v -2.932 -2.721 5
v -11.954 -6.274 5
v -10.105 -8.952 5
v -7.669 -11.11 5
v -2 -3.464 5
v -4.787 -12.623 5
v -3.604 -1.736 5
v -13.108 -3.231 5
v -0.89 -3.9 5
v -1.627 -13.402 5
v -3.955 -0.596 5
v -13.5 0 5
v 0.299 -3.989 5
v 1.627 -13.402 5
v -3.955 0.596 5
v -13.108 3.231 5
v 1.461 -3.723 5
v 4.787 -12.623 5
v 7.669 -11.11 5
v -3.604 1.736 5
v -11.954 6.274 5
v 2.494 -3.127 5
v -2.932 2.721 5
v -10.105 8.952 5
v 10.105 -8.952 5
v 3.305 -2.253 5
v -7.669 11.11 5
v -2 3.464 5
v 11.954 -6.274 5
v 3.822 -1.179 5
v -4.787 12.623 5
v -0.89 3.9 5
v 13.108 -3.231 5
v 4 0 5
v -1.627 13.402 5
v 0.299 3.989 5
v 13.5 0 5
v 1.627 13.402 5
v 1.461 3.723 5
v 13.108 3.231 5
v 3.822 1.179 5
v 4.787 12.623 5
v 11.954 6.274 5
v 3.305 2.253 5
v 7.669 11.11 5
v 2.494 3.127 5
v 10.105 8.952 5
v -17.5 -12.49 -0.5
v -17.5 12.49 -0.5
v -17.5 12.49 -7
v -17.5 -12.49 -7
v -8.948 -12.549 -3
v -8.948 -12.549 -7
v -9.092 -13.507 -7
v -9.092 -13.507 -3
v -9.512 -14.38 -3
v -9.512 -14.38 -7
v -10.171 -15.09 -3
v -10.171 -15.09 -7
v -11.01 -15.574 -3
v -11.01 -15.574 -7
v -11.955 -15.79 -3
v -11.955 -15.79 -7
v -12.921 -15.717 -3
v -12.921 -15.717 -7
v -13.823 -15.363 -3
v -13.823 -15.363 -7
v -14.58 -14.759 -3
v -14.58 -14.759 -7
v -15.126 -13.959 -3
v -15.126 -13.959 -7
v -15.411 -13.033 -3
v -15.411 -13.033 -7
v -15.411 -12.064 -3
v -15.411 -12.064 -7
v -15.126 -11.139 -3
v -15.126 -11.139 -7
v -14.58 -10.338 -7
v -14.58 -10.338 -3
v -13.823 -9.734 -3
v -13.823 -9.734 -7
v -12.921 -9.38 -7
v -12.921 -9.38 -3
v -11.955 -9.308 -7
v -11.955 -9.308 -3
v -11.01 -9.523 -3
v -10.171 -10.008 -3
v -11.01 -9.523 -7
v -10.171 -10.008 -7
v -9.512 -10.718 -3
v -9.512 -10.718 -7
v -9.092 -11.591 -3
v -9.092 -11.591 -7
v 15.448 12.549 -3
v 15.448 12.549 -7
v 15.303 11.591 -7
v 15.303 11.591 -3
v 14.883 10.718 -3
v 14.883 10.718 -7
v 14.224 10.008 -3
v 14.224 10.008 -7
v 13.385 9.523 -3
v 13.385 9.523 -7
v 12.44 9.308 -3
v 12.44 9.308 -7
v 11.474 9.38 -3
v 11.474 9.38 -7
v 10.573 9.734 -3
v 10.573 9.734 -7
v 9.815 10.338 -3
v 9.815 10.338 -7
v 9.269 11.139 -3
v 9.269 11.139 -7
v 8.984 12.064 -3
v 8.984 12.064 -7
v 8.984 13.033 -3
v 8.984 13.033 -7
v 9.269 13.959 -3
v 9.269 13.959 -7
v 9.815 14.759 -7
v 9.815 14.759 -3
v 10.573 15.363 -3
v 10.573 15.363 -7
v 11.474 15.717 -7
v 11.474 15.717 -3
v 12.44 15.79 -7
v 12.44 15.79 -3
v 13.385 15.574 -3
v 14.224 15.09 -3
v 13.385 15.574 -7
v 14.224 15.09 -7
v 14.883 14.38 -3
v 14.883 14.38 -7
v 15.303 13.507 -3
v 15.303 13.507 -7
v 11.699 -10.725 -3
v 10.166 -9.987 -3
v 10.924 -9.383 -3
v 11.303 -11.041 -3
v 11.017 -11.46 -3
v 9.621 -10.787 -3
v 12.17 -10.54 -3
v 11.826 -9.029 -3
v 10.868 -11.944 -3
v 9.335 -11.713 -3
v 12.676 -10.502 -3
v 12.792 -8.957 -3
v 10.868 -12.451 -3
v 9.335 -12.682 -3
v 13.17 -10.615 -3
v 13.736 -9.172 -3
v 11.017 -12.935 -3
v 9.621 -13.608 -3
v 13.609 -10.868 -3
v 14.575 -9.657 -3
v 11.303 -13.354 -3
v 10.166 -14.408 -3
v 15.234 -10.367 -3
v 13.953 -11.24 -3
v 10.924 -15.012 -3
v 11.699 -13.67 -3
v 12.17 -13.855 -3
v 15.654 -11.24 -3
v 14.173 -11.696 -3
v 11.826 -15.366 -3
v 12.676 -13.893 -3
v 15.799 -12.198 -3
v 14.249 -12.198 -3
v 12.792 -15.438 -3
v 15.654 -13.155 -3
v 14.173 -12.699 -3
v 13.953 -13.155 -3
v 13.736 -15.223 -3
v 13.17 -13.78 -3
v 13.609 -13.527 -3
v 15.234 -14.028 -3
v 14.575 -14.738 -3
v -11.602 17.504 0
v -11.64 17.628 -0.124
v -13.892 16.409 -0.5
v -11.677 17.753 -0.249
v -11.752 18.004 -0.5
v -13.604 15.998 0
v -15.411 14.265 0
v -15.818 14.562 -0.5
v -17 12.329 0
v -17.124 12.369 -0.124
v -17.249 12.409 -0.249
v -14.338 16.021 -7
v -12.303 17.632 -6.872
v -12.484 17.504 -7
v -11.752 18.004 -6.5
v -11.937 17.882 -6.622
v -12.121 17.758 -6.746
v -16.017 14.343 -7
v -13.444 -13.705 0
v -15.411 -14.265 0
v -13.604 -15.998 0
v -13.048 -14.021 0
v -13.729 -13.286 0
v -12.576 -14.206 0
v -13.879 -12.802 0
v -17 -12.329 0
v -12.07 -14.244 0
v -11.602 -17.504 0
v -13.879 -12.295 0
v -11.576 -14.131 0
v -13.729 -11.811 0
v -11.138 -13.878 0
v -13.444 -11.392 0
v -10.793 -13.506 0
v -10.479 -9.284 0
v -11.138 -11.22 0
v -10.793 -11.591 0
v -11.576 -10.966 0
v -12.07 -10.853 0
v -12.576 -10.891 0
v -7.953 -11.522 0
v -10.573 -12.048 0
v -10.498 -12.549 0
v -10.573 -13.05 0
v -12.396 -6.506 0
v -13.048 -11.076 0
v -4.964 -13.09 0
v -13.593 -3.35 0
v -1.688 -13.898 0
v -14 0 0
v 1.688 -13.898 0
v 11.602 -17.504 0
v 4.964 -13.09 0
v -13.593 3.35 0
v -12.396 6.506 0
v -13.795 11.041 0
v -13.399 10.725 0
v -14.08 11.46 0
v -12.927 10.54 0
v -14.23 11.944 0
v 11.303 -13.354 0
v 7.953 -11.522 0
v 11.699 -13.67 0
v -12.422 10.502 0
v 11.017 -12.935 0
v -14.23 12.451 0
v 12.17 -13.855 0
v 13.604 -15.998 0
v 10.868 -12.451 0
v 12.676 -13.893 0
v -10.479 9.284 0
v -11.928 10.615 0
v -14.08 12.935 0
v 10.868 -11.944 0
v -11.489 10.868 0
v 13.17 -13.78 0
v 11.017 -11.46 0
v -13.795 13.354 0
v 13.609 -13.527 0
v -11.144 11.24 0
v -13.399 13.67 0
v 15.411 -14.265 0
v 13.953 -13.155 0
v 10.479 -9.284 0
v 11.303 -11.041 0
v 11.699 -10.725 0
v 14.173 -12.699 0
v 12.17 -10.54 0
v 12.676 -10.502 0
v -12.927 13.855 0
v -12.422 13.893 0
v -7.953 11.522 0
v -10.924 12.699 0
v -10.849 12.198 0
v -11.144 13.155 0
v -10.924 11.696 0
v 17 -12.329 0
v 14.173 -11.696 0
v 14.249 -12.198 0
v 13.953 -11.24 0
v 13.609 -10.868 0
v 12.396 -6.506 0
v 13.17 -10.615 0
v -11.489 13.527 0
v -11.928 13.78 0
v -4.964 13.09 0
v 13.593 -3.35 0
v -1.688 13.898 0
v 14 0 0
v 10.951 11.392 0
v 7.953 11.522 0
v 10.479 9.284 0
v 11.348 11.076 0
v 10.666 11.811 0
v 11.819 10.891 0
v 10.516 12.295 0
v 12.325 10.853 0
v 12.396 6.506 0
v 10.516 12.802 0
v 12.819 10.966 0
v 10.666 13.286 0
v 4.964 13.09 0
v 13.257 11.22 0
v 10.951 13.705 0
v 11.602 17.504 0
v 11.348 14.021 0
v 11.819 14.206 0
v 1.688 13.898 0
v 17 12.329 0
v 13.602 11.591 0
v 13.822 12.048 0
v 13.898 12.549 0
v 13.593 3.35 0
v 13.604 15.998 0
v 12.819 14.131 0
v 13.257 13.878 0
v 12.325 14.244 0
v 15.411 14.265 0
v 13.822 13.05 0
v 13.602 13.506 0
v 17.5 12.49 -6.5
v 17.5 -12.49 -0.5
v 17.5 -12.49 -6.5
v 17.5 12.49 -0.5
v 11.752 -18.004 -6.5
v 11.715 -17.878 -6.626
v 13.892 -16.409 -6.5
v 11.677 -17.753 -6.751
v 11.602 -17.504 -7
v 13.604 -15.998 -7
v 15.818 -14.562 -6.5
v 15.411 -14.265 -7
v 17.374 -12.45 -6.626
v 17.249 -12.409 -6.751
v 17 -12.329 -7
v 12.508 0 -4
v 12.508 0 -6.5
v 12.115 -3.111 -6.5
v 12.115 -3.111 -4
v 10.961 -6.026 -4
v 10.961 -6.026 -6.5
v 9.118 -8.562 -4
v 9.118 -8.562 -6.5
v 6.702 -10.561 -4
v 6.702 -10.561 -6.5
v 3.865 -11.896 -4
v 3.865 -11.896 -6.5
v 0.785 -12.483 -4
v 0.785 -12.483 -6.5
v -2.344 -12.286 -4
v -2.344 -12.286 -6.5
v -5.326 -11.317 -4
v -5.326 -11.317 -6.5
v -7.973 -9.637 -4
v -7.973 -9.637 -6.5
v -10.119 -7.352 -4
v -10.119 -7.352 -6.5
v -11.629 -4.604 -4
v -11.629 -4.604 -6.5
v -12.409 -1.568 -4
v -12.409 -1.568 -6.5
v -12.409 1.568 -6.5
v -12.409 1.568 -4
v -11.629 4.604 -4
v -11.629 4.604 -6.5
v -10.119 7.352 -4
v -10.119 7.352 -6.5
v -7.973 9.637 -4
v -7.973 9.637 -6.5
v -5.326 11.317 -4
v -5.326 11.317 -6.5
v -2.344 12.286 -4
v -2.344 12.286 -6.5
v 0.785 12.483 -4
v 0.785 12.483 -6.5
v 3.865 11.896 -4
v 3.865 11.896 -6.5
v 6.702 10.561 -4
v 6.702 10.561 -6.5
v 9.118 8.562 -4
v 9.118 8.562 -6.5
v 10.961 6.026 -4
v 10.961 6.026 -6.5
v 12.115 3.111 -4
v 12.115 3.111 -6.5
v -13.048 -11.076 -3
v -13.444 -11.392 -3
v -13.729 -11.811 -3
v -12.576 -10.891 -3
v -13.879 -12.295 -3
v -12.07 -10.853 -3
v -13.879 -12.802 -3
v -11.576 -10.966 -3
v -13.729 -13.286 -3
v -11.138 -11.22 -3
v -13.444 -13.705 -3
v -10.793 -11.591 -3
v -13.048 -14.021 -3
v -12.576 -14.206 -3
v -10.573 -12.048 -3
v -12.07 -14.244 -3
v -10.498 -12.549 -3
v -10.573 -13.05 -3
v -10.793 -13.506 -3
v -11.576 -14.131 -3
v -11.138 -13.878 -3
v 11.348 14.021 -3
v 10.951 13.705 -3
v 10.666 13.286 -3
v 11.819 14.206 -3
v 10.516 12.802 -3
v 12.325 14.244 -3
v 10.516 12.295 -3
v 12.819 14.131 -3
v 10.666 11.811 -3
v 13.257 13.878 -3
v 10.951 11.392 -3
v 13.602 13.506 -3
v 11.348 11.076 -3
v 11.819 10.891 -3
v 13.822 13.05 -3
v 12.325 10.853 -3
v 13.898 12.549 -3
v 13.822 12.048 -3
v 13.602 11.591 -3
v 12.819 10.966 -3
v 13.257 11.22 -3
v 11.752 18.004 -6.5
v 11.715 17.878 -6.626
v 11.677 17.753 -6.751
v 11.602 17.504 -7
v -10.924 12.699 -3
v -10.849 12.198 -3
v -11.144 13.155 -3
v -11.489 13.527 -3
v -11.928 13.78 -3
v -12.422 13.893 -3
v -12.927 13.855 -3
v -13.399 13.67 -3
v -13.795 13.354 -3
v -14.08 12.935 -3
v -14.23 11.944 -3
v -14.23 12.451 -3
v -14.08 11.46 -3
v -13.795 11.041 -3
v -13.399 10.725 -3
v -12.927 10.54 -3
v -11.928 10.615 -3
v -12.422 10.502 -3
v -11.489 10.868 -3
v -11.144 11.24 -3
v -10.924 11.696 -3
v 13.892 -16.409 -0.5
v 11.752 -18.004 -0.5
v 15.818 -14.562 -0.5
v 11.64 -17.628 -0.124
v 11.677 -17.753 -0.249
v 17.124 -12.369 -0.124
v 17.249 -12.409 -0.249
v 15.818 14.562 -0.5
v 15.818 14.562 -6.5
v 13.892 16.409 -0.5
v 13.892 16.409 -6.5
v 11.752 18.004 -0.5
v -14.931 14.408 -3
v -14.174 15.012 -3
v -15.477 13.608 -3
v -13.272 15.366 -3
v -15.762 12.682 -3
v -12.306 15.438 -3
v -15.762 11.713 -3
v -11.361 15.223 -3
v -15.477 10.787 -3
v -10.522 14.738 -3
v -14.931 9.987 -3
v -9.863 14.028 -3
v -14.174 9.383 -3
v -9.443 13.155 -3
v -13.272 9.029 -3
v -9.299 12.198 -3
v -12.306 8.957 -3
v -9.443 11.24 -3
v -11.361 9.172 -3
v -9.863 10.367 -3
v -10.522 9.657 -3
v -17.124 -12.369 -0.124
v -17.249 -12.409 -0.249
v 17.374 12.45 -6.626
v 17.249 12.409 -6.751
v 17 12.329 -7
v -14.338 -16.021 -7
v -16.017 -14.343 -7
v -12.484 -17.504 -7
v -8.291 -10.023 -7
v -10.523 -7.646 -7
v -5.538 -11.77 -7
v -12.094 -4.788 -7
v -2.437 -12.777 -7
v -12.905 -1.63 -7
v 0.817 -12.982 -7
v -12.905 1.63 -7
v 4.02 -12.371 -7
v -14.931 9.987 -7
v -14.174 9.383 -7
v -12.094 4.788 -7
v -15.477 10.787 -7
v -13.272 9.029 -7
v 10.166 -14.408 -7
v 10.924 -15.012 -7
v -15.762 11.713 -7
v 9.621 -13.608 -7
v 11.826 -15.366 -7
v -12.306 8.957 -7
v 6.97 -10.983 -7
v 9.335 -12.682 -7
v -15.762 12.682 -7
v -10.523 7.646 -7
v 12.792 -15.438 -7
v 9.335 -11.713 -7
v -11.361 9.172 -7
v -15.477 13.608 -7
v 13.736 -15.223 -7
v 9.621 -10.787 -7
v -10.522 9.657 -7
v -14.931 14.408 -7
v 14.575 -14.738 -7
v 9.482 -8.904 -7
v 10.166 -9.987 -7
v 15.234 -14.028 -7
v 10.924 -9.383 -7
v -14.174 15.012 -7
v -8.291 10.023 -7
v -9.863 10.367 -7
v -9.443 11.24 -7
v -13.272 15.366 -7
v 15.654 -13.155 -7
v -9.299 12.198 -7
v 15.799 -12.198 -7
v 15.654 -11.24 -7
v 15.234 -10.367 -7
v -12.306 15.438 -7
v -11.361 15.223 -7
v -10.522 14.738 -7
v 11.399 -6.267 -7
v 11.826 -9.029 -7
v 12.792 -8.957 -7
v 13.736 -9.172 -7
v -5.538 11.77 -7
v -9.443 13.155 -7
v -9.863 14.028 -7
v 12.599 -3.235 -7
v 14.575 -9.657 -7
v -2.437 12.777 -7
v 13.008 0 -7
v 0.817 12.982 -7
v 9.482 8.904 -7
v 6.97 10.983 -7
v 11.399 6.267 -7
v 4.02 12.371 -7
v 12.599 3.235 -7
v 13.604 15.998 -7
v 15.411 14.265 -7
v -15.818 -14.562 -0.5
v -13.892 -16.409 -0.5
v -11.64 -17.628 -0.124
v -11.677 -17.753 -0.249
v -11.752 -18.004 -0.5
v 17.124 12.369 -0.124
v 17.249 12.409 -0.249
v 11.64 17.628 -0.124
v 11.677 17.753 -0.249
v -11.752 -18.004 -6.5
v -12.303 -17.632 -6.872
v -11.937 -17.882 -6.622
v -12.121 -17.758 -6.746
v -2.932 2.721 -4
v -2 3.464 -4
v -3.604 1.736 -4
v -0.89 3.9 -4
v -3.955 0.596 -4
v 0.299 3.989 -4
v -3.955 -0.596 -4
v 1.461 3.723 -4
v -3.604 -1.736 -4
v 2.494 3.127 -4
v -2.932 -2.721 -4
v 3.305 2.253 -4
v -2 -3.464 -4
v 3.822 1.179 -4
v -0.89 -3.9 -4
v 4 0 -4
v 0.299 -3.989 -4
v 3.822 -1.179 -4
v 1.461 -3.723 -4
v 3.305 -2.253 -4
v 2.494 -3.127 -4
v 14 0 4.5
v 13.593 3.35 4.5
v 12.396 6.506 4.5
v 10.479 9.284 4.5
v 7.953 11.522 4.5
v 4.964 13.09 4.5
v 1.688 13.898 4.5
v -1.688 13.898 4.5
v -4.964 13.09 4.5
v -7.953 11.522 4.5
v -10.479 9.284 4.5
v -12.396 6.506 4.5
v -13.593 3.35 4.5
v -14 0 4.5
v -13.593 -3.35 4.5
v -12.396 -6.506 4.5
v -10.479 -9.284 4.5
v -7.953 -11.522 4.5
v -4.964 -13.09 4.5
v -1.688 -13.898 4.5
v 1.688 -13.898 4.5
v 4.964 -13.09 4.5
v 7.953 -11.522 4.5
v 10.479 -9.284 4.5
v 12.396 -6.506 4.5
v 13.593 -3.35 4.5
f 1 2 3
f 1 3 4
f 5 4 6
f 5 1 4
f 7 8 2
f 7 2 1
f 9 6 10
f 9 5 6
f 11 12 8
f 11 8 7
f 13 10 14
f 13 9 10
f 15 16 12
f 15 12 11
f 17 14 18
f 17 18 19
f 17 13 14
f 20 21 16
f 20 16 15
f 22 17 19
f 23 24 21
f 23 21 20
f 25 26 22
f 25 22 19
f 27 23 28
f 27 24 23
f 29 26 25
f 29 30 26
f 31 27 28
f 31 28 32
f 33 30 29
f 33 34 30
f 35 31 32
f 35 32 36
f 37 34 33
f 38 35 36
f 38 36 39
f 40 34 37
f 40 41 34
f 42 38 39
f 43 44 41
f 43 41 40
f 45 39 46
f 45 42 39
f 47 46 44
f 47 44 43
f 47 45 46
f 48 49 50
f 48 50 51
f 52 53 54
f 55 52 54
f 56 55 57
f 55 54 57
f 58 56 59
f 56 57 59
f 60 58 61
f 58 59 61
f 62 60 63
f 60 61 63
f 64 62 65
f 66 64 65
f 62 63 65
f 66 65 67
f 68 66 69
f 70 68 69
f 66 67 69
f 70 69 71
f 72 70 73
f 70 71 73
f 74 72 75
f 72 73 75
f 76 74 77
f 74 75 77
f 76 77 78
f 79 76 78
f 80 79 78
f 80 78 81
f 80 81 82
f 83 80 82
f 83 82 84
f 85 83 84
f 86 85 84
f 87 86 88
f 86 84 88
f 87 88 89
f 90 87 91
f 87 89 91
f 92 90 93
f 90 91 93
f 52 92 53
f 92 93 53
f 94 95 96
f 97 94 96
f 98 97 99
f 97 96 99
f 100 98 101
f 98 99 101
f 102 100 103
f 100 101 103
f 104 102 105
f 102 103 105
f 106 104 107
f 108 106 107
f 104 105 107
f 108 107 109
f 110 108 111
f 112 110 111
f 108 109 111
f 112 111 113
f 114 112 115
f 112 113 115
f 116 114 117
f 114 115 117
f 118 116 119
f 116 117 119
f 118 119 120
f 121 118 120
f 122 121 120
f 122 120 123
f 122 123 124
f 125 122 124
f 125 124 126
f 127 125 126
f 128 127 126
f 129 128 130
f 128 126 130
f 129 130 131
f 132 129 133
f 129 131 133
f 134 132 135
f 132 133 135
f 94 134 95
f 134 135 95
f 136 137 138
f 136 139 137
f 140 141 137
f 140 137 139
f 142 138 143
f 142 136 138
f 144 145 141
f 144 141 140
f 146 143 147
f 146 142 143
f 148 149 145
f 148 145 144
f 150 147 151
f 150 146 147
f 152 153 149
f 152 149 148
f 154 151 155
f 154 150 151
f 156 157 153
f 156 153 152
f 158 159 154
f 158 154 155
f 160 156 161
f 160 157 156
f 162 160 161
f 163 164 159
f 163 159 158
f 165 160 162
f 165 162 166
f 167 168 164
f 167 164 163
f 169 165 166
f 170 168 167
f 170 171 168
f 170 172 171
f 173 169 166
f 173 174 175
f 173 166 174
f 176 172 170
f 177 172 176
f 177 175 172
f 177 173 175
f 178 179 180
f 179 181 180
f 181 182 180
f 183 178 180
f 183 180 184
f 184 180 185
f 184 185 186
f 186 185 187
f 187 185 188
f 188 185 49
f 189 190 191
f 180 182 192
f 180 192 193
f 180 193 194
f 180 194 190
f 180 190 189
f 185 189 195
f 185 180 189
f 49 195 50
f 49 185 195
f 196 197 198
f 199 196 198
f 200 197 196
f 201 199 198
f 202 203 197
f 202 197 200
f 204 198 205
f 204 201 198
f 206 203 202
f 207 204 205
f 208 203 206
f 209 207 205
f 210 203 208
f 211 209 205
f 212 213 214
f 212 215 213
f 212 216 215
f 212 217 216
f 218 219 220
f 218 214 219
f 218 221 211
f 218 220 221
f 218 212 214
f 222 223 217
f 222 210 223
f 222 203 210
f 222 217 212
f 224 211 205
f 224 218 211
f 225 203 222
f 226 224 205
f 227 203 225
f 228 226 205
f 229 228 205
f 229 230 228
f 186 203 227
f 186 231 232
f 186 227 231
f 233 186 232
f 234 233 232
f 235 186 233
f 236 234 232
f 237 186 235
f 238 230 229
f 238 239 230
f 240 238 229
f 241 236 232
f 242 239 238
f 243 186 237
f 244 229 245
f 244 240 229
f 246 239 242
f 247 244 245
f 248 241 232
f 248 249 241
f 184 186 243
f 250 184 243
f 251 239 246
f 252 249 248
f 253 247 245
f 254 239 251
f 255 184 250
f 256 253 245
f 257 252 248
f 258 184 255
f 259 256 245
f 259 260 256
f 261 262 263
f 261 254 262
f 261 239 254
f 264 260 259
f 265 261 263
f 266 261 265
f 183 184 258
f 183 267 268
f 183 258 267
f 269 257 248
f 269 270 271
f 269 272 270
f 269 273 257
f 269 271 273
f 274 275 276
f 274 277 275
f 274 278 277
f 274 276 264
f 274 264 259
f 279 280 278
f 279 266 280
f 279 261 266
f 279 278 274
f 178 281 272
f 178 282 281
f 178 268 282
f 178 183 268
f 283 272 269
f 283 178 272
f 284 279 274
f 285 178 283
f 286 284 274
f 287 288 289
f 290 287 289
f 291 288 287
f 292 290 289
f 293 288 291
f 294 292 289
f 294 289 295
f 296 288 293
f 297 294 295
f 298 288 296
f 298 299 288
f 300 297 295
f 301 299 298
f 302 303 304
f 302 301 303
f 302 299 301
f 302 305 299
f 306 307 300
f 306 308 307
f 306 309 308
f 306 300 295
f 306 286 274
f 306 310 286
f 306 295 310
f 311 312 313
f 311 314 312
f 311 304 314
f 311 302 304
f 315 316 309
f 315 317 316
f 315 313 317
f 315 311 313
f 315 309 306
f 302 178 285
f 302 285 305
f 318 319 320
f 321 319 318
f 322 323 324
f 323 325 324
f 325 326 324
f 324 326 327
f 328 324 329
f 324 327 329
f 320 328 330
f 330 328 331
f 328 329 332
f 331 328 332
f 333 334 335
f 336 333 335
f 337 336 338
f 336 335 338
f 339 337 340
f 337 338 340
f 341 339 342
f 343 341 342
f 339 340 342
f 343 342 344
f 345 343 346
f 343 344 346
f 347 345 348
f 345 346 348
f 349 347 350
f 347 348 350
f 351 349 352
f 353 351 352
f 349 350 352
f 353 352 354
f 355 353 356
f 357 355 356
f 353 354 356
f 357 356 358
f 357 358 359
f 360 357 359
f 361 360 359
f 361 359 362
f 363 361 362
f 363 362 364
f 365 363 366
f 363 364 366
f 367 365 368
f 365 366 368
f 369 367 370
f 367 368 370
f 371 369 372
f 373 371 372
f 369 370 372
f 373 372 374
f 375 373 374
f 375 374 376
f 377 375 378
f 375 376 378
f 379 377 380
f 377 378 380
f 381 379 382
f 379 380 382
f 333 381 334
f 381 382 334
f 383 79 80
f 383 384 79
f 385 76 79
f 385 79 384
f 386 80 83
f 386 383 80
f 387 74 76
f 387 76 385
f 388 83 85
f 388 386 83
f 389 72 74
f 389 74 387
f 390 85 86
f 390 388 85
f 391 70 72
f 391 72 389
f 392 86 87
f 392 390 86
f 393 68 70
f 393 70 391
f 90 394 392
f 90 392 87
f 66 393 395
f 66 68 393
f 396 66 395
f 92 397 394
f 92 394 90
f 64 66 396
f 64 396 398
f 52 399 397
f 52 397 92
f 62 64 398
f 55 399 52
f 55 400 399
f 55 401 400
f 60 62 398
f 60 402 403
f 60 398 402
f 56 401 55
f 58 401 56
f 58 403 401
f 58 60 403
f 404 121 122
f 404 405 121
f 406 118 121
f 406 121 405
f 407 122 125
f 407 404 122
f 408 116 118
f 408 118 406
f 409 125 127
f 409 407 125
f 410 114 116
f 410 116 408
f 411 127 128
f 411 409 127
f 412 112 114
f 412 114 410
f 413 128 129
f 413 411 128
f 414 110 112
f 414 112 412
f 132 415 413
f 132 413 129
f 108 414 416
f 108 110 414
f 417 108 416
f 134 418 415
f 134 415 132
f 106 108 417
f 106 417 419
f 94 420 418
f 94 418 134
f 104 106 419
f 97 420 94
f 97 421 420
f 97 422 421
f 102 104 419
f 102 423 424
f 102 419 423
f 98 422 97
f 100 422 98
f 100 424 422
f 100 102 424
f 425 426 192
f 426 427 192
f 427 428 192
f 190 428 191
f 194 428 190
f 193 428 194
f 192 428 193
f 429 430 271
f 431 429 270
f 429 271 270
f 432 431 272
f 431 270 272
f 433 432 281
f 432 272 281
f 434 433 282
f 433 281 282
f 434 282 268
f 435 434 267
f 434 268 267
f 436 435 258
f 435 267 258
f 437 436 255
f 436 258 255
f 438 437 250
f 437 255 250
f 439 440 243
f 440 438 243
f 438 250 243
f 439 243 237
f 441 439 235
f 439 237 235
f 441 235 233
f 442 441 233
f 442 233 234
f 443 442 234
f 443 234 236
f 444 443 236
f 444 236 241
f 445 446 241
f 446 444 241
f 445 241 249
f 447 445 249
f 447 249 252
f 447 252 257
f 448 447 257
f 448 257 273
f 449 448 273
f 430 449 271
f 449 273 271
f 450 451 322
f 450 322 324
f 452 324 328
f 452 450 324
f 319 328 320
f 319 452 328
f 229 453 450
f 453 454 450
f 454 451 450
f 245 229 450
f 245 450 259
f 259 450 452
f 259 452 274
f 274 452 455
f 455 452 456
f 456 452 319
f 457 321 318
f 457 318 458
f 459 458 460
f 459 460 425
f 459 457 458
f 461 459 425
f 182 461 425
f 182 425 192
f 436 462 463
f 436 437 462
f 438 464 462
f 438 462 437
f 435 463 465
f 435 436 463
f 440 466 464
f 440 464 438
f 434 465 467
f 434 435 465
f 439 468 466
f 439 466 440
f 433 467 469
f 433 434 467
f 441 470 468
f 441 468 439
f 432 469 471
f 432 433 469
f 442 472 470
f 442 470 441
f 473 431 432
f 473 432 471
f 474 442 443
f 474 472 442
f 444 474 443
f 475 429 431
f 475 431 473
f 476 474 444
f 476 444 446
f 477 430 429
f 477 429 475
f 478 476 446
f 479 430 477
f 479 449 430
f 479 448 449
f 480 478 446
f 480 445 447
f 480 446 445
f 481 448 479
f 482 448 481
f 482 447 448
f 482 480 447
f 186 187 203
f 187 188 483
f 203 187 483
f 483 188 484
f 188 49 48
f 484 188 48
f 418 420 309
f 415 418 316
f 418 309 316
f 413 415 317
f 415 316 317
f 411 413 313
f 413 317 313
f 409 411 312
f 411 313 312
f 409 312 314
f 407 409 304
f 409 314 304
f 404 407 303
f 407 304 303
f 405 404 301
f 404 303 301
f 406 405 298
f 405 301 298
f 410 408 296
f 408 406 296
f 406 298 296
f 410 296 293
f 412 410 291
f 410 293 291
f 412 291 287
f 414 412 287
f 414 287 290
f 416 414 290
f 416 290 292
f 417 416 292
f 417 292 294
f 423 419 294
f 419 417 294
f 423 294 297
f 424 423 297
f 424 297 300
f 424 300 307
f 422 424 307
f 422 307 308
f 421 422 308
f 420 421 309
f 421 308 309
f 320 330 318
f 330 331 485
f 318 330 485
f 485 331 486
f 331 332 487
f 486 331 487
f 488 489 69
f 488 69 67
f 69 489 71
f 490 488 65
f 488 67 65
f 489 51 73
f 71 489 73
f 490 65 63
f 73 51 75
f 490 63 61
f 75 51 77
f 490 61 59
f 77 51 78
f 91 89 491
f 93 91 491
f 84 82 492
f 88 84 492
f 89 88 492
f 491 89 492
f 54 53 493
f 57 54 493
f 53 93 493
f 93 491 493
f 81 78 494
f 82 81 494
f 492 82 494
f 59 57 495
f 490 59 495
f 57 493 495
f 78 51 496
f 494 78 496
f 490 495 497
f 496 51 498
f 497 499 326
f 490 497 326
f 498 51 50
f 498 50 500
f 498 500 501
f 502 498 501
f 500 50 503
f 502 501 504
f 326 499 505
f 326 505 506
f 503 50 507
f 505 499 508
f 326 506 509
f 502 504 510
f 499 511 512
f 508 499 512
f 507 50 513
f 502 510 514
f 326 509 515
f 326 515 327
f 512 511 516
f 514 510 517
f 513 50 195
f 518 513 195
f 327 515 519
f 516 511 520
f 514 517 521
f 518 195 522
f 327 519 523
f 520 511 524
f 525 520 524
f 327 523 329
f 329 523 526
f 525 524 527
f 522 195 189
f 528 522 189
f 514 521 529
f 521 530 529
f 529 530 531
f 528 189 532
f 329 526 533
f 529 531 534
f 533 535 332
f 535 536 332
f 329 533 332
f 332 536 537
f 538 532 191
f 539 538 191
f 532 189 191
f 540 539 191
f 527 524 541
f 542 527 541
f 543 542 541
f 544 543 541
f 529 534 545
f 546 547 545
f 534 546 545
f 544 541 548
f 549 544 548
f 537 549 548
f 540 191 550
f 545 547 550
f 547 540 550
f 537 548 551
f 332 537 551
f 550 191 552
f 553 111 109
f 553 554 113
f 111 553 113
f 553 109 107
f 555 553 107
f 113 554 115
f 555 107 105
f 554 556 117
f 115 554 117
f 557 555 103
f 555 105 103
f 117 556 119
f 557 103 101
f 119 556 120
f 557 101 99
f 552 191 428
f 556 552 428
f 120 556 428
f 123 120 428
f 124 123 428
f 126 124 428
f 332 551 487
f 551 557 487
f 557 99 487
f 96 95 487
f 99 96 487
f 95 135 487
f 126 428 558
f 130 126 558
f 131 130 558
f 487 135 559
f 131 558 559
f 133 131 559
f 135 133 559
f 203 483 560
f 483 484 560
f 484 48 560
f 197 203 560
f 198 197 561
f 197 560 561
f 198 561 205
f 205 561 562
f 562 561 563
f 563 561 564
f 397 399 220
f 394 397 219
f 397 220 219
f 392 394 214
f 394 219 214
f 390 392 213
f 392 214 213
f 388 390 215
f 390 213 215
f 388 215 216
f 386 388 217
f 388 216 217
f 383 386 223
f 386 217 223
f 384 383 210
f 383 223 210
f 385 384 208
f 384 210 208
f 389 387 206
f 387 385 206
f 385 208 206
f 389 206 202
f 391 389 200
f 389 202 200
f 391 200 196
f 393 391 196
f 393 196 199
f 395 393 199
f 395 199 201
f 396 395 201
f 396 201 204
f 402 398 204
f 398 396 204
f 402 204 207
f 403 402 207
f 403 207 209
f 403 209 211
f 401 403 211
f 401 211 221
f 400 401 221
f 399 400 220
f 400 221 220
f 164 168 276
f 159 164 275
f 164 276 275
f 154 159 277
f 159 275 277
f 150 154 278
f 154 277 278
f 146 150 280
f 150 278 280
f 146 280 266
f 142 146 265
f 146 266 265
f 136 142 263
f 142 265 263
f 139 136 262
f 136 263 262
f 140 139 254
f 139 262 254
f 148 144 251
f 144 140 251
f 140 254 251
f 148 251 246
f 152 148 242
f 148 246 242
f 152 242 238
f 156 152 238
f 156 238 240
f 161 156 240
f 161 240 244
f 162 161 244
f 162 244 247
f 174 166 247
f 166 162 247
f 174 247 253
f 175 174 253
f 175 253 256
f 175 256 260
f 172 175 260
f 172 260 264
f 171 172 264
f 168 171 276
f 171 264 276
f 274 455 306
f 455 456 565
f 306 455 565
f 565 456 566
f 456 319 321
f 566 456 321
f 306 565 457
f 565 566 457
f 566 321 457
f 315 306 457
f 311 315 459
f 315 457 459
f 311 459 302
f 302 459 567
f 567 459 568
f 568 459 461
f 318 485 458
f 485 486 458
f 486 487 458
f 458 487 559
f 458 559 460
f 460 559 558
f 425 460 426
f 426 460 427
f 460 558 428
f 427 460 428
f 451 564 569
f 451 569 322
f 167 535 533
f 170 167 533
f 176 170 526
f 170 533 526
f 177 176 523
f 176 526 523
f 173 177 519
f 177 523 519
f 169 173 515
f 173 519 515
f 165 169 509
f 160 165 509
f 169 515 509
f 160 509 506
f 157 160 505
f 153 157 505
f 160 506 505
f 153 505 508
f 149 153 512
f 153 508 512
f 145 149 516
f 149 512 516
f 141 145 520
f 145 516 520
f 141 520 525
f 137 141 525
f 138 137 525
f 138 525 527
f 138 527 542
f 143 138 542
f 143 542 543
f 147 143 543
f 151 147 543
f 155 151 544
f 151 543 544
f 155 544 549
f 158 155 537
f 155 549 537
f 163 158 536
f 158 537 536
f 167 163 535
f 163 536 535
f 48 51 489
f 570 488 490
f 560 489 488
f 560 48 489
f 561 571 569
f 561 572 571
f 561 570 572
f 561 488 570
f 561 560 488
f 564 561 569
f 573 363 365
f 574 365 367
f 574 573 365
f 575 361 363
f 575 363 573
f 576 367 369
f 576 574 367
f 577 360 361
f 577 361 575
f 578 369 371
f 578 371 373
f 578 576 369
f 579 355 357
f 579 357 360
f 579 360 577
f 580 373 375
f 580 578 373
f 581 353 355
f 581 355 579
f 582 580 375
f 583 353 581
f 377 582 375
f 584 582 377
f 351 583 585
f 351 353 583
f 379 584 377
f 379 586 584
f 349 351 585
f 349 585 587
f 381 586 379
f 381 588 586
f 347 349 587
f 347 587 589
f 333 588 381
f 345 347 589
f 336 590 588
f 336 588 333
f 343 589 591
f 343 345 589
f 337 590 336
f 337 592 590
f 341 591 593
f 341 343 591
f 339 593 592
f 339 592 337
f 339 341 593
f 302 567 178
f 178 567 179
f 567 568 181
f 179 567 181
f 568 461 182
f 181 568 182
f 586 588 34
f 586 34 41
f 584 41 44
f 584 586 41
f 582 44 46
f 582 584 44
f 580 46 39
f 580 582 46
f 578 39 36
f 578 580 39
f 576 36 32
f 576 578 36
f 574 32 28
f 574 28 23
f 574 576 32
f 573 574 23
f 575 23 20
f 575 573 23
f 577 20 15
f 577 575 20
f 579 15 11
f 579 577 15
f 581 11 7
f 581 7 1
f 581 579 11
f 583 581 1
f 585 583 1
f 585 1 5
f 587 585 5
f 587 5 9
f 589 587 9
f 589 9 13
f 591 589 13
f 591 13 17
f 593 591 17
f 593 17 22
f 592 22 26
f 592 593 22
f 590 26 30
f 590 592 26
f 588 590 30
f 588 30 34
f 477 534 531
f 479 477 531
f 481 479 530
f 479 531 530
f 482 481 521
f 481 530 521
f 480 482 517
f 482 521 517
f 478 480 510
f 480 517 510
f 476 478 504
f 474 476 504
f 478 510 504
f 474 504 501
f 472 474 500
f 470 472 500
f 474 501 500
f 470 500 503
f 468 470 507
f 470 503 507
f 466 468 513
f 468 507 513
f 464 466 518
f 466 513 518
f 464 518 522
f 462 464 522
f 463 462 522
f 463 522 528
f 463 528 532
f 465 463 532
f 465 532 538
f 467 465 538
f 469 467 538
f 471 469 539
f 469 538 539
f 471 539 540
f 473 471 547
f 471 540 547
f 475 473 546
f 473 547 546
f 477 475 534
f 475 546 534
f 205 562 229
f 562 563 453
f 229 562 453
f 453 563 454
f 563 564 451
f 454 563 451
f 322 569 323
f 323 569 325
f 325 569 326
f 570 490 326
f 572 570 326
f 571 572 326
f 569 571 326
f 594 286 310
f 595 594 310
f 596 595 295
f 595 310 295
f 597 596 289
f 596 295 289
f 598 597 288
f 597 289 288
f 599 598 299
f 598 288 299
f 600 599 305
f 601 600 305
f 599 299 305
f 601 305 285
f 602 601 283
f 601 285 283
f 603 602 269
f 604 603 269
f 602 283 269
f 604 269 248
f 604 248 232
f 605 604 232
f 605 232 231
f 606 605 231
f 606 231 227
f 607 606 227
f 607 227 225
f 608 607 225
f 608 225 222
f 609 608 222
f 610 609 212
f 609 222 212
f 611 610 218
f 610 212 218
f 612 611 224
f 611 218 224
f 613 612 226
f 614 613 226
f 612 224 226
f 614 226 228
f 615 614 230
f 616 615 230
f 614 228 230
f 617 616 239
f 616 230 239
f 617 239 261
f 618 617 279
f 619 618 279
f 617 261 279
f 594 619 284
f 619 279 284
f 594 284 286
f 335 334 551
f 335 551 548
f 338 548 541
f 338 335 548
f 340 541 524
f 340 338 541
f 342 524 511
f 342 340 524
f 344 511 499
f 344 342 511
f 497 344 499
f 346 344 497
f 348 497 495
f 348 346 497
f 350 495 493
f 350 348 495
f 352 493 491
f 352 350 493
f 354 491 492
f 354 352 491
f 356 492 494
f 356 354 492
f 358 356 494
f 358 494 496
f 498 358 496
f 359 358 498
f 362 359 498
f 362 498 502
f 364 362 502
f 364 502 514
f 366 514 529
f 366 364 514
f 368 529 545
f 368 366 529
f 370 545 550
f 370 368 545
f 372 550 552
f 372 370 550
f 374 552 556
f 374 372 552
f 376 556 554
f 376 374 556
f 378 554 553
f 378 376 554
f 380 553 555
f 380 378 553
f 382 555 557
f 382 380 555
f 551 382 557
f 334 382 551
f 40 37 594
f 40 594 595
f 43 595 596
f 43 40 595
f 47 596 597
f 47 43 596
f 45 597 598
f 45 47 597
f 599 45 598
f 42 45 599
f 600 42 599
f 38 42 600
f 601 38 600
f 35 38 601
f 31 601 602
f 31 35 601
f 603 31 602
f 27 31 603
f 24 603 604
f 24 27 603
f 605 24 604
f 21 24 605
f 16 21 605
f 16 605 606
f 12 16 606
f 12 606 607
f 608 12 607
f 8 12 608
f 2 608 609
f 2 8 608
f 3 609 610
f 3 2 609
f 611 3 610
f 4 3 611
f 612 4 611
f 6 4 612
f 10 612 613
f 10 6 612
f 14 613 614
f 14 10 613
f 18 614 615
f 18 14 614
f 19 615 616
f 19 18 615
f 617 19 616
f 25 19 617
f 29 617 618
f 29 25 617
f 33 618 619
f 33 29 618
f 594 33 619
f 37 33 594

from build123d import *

# Parameters (mm, degrees)
F0_R     = 3.25
F0_R_2   = 14
F0_R_3   = 4
F0_R_4   = 1.7
F1_DEPTH = 7
F2_DEPTH = 5
F3_R     = 3.25
F3_R_2   = 1.7
F4_DEPTH = 4
F3_R_3   = 12.5077468671
F3_R_4   = 4
F5_DEPTH = 3
F6_SIZE  = 0.5


with BuildPart() as f1:
    # F0 (on Top) → F1 (new body)
    with BuildSketch(Plane.XY):
        with BuildLine():
            ThreePointArc((17.5, 12.4899959968), (14.8835536543, 15.5154706864), (11.7519612405, 18.0039275438))
            Line((11.7519612405, 18.0039275438), (-11.7519612405, 18.0039275438))
            ThreePointArc((-11.7519612405, 18.0039275438), (-14.8835536543, 15.5154706864), (-17.5, 12.4899959968))
            Line((-17.5, 12.4899959968), (-17.5, -12.4899959968))
            ThreePointArc((-17.5, -12.4899959968), (-14.8835536543, -15.5154706864), (-11.7519612405, -18.0039275438))
            Line((-11.7519612405, -18.0039275438), (11.7519612405, -18.0039275438))
            ThreePointArc((11.7519612405, -18.0039275438), (14.8835536543, -15.5154706864), (17.5, -12.4899959968))
            Line((17.5, -12.4899959968), (17.5, 12.4899959968))
        make_face()
        with Locations((-12.1975036036, -12.5487412054)):
            Circle(F0_R, mode=Mode.SUBTRACT)
        with Locations((12.5487412054, -12.1975036036)):
            Circle(F0_R, mode=Mode.SUBTRACT)
        with Locations((-12.5487412054, 12.1975036036)):
            Circle(F0_R, mode=Mode.SUBTRACT)
        Circle(F0_R_2, mode=Mode.SUBTRACT)
        with Locations((12.1975036036, 12.5487412054)):
            Circle(F0_R, mode=Mode.SUBTRACT)
        Circle(F0_R_2)
        Circle(F0_R_3, mode=Mode.SUBTRACT)
        with Locations((12.1975036036, 12.5487412054)):
            Circle(F0_R)
        with Locations((12.1975036036, 12.5487412054)):
            Circle(F0_R_4, mode=Mode.SUBTRACT)
        with Locations((-12.5487412054, 12.1975036036)):
            Circle(F0_R)
        with Locations((-12.5487412054, 12.1975036036)):
            Circle(F0_R_4, mode=Mode.SUBTRACT)
        with Locations((-12.1975036036, -12.5487412054)):
            Circle(F0_R)
        with Locations((-12.1975036036, -12.5487412054)):
            Circle(F0_R_4, mode=Mode.SUBTRACT)
        with Locations((12.5487412054, -12.1975036036)):
            Circle(F0_R)
        with Locations((12.5487412054, -12.1975036036)):
            Circle(F0_R_4, mode=Mode.SUBTRACT)
    extrude(amount=-F1_DEPTH)

    # F0 (on Top) → F2 (join)
    with BuildSketch(Plane.XY):
        Circle(F0_R_2)
        Circle(F0_R_3, mode=Mode.SUBTRACT)
    extrude(amount=F2_DEPTH)

    # F3 (on face) → F4 (cut)
    with BuildSketch(Plane(origin=(0, 0, -7), x_dir=(1, 0, 0), z_dir=(0, 0, -1))):
        with Locations((-12.1975036036, 12.5487412054)):
            Circle(F3_R)
        with Locations((-12.1975036036, 12.5487412054)):
            Circle(F3_R_2, mode=Mode.SUBTRACT)
        with Locations((12.5487412054, 12.1975036036)):
            Circle(F3_R)
        with Locations((12.5487412054, 12.1975036036)):
            Circle(F3_R_2, mode=Mode.SUBTRACT)
        with Locations((12.1975036036, -12.5487412054)):
            Circle(F3_R)
        with Locations((12.1975036036, -12.5487412054)):
            Circle(F3_R_2, mode=Mode.SUBTRACT)
        with Locations((-12.5487412054, -12.1975036036)):
            Circle(F3_R)
        with Locations((-12.5487412054, -12.1975036036)):
            Circle(F3_R_2, mode=Mode.SUBTRACT)
    extrude(amount=-F4_DEPTH, mode=Mode.SUBTRACT)

    # F3 (on face) → F5 (cut)
    with BuildSketch(Plane(origin=(0, 0, -7), x_dir=(1, 0, 0), z_dir=(0, 0, -1))):
        Circle(F3_R_3)
        Circle(F3_R_4, mode=Mode.SUBTRACT)
    extrude(amount=-F5_DEPTH, mode=Mode.SUBTRACT)

    # F6
    f6_edges = [f1.edges().sort_by_distance(p)[0] for p in [
        (-17.5, 0, 0),
        (-14.883554, -15.515471, 0),
        (0, -18.003928, -7),
        (14.883554, -15.515471, -7),
        (17.5, 0, -7),
        (14.883554, 15.515471, -7),
        (0, 18.003928, -7),
        (-14.883554, 15.515471, 0),
        (-12.507747, 0, -7),
        (-14, 0, 5),
        (14.883554, 15.515471, 0),
        (17.5, 0, 0),
        (14.883554, -15.515471, 0),
        (0, -18.003928, 0),
        (0, 18.003928, 0),
    ]]
    chamfer(f6_edges, length=F6_SIZE)


solid = f1.part
